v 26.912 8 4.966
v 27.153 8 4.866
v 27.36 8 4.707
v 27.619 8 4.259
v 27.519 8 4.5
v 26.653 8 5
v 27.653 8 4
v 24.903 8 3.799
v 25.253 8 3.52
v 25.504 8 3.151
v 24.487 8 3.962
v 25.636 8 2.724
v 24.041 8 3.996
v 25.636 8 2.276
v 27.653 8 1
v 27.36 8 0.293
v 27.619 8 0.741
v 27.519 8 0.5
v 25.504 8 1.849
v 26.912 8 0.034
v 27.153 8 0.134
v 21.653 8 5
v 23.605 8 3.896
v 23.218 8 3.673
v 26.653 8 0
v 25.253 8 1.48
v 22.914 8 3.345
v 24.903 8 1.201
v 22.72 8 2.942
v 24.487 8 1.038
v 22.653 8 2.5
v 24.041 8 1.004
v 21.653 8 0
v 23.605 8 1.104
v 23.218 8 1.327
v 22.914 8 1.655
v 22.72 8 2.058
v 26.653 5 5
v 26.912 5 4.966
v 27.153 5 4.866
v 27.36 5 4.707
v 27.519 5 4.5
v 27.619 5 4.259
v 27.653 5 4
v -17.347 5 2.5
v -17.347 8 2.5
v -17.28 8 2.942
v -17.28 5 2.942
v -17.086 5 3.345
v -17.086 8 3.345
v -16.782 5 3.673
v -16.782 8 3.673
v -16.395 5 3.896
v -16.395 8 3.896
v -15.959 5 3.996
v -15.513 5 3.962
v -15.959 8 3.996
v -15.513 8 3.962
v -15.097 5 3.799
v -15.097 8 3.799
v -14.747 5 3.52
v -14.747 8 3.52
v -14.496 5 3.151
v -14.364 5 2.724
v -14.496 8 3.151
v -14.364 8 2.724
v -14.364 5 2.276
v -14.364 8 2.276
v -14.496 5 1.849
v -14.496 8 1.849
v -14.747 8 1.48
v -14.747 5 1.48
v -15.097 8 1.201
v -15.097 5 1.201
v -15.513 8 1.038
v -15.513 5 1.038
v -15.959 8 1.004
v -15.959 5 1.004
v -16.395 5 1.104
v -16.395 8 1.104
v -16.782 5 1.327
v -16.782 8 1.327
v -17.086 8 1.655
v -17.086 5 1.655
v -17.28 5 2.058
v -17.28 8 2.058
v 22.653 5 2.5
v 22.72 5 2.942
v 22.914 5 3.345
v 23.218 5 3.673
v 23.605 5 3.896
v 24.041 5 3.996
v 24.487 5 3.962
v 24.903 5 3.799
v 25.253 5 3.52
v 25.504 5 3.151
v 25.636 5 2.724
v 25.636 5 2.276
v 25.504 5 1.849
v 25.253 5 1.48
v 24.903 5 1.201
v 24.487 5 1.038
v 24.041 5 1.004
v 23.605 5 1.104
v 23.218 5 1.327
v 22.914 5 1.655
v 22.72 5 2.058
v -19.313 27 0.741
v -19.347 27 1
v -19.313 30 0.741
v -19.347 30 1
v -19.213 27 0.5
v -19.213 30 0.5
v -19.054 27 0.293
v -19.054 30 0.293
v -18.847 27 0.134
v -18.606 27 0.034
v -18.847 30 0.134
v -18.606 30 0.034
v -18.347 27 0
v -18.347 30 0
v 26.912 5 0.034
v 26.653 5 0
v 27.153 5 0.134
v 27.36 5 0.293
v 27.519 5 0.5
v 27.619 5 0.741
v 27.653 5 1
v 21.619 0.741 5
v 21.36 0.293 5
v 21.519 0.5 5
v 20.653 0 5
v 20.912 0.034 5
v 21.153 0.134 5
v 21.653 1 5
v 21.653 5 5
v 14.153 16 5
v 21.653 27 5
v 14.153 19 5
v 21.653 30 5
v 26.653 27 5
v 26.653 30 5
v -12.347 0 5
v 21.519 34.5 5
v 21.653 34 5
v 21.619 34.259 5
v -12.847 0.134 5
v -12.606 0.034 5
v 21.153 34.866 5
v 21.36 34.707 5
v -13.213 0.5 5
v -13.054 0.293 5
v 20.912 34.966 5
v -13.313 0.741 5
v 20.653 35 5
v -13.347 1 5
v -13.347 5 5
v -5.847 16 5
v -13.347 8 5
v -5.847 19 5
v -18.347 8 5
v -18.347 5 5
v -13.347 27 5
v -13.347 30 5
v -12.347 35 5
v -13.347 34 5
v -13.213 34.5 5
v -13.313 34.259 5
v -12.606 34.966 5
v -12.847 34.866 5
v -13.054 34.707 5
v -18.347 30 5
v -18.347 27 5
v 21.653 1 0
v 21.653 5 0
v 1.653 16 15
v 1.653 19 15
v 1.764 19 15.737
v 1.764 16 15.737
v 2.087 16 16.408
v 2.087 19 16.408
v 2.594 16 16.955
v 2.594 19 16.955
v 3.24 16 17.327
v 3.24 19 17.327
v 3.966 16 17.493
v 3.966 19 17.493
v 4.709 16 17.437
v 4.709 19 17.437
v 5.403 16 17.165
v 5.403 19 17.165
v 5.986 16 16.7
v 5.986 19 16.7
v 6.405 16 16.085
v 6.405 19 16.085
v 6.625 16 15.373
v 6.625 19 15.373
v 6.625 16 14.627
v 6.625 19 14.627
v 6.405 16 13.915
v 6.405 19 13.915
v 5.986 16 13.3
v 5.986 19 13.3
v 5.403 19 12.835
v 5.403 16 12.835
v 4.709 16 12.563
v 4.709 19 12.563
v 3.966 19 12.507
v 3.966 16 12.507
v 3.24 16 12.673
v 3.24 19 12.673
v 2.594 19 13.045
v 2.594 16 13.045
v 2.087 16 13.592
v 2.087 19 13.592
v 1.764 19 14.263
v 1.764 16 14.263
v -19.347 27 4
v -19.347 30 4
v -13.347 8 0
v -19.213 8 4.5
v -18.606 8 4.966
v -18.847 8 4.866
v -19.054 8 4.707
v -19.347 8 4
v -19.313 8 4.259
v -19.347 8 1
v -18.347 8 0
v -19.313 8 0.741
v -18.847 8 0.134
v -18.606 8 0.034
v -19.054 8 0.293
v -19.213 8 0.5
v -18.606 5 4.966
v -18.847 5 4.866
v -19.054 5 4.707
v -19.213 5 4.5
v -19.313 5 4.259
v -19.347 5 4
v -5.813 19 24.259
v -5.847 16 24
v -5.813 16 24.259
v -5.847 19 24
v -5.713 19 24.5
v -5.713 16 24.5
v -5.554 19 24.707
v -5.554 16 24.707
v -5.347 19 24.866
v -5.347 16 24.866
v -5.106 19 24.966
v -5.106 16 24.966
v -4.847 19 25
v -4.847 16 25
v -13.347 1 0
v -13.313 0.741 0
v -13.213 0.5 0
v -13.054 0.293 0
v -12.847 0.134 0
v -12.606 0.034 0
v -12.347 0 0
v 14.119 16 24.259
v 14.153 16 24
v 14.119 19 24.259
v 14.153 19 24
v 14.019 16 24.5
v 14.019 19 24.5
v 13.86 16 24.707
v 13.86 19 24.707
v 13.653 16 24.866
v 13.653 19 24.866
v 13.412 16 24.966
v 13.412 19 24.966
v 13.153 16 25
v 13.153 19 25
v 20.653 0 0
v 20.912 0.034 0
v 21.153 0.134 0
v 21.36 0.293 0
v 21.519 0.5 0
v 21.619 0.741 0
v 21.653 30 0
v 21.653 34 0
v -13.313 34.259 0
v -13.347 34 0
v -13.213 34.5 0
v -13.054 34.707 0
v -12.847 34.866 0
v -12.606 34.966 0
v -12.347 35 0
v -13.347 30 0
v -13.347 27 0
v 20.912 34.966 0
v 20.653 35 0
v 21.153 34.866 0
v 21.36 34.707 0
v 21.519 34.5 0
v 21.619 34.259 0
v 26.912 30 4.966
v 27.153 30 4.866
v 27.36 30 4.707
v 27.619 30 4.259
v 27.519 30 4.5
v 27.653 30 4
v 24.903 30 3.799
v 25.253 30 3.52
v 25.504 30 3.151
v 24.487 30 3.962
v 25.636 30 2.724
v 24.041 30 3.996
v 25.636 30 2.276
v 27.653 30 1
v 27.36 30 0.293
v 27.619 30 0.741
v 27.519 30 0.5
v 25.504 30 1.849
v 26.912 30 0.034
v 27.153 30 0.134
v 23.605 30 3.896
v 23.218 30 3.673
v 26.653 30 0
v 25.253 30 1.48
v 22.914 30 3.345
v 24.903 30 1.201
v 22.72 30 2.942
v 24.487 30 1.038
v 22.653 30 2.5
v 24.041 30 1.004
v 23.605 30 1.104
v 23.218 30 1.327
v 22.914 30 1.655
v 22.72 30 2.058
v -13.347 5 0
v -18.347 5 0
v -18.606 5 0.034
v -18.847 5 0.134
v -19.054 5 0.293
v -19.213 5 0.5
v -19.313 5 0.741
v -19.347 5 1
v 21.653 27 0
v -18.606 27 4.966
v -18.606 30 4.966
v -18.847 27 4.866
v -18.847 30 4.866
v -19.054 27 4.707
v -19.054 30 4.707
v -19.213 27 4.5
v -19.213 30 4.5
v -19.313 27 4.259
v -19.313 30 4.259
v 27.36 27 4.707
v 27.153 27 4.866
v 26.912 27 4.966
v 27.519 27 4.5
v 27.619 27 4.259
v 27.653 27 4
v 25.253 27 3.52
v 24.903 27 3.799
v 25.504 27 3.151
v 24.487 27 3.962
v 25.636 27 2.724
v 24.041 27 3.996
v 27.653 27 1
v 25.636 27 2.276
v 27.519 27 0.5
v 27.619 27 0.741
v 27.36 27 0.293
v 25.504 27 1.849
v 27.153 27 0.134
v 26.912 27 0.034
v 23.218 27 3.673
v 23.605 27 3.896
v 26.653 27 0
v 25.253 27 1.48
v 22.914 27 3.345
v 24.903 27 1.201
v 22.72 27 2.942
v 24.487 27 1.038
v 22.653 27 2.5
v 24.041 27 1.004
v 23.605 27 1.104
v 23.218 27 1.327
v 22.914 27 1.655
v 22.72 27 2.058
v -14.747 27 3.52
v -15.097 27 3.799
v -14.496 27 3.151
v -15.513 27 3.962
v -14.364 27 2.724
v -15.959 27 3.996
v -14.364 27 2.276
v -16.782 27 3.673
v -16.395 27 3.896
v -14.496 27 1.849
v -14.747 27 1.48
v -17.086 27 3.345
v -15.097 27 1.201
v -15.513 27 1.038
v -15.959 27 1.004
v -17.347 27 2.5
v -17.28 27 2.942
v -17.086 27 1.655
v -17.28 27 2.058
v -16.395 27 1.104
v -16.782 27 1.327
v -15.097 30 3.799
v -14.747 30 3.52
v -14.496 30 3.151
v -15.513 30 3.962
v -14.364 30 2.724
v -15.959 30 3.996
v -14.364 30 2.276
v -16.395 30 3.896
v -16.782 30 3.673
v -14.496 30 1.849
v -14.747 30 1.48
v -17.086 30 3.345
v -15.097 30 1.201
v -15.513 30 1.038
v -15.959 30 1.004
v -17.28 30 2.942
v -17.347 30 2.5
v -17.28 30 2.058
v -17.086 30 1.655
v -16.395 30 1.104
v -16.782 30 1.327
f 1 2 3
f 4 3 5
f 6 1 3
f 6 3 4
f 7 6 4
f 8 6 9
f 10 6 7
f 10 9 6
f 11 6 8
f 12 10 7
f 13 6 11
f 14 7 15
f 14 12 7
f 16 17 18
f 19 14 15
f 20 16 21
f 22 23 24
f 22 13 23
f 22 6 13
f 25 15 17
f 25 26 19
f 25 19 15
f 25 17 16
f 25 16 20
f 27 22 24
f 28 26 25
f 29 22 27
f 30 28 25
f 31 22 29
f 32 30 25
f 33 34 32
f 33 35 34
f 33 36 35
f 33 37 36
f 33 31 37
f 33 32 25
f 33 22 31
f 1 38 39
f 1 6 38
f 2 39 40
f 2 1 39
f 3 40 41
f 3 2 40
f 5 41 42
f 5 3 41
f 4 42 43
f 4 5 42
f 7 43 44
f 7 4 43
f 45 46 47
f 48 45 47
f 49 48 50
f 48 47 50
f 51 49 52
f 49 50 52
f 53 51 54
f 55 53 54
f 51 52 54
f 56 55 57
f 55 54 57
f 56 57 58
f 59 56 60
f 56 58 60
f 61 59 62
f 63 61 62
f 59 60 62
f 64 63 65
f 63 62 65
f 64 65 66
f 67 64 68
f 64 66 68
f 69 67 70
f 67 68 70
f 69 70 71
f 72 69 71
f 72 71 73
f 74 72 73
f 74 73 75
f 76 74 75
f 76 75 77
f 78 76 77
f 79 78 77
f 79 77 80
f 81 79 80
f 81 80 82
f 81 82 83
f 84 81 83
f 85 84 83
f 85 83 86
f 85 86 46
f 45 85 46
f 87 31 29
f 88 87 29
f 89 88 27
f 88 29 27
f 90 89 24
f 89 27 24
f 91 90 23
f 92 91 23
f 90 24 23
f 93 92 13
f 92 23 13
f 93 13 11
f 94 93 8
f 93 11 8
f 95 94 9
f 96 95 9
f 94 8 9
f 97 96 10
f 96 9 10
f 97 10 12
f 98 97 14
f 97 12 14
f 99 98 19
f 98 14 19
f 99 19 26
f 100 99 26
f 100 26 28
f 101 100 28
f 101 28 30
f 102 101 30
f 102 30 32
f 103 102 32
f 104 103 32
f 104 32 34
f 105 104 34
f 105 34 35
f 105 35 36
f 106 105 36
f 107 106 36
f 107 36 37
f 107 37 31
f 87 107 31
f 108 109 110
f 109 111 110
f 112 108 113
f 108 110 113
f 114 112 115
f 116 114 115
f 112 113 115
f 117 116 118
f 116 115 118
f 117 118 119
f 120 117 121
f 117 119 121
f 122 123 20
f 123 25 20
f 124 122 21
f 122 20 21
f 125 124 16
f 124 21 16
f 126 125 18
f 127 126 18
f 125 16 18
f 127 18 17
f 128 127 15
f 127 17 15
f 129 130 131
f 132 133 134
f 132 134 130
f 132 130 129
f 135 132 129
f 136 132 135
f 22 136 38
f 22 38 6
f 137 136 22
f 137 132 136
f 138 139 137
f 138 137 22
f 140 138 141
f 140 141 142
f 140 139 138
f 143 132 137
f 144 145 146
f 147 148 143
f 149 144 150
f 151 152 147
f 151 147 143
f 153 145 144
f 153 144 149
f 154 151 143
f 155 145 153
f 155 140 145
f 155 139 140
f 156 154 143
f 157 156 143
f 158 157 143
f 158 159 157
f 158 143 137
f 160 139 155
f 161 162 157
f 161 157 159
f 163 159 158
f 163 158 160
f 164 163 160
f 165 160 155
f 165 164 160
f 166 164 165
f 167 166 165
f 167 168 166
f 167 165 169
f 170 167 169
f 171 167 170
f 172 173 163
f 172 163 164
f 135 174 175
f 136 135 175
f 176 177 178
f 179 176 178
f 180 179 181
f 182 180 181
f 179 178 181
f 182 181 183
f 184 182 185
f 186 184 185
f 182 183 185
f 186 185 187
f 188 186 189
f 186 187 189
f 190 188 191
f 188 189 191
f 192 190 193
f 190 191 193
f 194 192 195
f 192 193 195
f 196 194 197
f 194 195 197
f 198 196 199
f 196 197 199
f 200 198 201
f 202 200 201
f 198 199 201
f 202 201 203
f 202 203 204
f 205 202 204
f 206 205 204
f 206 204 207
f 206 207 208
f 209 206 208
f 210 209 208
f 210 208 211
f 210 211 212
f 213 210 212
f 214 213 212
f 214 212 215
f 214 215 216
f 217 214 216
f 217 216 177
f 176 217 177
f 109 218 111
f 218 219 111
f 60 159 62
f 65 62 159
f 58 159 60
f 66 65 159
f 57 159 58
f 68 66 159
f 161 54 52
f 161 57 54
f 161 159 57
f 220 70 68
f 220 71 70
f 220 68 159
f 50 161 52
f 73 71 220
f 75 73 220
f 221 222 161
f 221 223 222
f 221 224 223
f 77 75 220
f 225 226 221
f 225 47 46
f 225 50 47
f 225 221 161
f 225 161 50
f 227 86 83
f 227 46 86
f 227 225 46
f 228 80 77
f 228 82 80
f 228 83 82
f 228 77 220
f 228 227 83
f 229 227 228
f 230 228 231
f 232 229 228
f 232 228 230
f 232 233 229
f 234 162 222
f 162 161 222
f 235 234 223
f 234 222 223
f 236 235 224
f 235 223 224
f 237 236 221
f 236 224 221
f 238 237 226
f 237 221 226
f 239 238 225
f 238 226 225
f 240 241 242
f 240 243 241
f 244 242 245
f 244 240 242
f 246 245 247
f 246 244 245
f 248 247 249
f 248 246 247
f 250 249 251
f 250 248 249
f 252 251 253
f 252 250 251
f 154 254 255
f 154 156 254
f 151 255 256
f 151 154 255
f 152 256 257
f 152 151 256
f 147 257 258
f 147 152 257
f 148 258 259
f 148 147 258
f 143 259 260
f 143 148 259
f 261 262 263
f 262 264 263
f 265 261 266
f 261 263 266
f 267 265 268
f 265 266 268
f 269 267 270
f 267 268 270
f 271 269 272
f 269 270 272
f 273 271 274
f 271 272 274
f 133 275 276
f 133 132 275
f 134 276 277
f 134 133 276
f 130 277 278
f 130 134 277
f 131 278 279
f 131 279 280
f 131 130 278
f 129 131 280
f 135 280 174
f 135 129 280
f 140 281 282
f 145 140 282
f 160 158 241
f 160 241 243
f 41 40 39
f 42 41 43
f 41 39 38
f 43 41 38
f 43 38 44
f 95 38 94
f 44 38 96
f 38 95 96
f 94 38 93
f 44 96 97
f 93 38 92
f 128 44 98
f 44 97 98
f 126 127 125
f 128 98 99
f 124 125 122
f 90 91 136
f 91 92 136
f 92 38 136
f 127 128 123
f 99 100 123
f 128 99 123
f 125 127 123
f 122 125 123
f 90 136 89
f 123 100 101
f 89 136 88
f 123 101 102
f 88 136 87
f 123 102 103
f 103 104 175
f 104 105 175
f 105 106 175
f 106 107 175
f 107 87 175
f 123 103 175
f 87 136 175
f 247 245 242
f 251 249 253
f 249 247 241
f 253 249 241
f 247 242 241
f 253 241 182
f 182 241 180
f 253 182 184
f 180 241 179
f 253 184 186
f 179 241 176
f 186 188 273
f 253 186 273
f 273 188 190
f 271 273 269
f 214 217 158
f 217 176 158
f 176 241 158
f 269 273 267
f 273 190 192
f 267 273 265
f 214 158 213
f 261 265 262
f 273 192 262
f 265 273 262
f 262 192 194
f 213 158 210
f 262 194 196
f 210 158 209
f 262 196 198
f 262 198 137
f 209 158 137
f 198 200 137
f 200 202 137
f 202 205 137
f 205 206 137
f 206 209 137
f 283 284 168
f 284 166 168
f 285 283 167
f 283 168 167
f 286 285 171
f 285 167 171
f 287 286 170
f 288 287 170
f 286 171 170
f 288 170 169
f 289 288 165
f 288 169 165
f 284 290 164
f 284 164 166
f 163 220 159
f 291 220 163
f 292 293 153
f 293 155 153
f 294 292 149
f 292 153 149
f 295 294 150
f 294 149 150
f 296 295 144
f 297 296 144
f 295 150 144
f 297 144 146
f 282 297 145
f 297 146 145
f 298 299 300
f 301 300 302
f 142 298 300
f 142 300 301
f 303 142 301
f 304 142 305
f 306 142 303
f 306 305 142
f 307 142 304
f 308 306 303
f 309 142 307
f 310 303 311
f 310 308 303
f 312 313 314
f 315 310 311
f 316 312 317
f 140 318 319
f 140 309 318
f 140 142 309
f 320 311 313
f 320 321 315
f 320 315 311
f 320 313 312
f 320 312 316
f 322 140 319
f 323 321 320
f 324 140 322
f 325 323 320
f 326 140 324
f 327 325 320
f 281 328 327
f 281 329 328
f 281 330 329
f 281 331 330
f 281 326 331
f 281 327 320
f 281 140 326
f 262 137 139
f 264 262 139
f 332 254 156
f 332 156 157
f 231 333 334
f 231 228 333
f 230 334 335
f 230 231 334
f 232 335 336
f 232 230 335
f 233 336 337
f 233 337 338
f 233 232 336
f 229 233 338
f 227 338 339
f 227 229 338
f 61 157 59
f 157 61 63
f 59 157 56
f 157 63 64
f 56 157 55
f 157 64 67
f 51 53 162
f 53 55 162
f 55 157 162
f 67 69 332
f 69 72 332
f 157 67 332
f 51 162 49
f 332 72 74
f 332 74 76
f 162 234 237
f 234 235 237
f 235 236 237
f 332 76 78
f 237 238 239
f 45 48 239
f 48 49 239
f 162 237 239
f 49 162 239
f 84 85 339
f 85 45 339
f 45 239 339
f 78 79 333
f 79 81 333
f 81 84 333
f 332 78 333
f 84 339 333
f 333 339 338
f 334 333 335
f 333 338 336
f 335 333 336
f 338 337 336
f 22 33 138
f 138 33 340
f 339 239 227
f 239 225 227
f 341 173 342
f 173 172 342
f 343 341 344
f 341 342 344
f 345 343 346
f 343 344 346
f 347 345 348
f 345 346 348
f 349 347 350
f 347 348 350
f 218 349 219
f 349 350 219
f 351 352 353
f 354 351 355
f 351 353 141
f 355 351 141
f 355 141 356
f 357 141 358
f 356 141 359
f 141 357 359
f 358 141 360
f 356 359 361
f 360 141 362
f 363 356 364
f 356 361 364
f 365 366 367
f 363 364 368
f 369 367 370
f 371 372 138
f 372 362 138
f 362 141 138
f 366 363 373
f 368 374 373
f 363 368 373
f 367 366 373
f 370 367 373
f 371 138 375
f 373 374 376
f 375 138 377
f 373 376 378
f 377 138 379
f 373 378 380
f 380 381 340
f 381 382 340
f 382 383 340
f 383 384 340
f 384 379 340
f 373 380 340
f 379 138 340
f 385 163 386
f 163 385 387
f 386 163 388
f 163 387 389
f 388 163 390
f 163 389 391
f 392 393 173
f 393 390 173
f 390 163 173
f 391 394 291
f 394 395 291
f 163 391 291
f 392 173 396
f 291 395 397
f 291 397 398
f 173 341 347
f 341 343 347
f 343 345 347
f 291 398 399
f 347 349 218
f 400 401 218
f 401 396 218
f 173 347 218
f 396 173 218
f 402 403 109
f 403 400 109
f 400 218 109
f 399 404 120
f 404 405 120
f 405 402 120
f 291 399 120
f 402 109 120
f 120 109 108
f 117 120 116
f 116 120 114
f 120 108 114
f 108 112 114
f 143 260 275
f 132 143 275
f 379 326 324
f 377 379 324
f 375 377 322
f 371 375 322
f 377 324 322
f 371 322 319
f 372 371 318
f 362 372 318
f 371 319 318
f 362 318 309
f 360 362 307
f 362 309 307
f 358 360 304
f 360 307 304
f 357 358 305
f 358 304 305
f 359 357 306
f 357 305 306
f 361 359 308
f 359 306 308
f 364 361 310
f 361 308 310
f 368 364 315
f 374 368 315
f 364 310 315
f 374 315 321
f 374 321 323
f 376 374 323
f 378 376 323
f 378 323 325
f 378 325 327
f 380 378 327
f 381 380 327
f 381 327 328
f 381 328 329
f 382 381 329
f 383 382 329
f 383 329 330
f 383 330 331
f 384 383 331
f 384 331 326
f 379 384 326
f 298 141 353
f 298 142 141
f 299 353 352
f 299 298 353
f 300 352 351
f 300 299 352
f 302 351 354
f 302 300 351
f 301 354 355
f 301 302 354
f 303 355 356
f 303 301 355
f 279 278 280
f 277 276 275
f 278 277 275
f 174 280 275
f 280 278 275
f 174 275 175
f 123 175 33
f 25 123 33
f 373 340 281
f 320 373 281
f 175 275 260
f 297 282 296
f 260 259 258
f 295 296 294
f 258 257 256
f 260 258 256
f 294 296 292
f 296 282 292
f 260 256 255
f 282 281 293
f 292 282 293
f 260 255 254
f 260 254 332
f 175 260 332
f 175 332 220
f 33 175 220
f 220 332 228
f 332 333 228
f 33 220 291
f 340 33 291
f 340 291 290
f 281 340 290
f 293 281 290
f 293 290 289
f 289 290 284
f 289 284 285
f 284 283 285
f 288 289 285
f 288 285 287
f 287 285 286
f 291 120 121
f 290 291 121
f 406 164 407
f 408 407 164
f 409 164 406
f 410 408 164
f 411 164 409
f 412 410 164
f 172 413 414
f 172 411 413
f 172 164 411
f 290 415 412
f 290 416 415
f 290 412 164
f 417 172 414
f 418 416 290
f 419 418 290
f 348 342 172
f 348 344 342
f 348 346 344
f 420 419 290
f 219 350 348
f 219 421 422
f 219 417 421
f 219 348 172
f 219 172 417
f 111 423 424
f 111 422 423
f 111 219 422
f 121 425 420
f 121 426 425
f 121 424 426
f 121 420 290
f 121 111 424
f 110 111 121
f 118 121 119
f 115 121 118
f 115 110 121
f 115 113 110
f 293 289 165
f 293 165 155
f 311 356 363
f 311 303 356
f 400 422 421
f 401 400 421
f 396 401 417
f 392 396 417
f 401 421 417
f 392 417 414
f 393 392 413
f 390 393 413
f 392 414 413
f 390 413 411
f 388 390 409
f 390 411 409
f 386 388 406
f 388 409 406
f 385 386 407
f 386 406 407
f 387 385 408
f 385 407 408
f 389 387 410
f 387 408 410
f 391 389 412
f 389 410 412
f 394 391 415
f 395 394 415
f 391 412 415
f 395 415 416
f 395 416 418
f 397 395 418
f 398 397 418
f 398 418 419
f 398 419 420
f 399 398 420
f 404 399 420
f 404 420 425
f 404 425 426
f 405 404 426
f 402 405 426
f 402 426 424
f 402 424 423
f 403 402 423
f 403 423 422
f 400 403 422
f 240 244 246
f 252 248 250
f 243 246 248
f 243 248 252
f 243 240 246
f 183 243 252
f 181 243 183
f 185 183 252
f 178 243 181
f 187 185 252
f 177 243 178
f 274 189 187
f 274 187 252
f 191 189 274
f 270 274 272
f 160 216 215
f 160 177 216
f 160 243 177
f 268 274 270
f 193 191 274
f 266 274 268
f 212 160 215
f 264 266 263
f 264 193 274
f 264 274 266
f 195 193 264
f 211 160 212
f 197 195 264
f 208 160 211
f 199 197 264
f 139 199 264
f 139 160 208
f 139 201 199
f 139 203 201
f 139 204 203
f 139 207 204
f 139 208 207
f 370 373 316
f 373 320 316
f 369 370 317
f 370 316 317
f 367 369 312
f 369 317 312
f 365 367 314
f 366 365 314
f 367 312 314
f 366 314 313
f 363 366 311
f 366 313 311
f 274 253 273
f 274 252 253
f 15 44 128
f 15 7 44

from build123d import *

# Parameters (mm, degrees)
SKETCH1_W                = 35
SKETCH1_H                = 35
BOSS_EXTRUDE2_DEPTH      = 5
BOSS_EXTRUDE3_DEPTH      = 6
BOSS_EXTRUDE3_DEPTH_BACK = 41
SKETCH2_W                = 5
SKETCH2_H                = 3
FILLET1_R                = 1
F_3_0MM_DOWEL_HOLE1_D    = 3
SKETCH6_W                = 20
SKETCH6_H                = 3
BOSS_EXTRUDE4_DEPTH      = 20
F_5_0MM_DOWEL_HOLE1_D    = 5
FILLET2_R                = 1
FILLET3_R                = 1


with BuildPart() as part:
    # Sketch1 → Boss-Extrude2 (new body)
    with BuildSketch(Plane.XY):
        with Locations((4.15299246, 17.5)):
            Rectangle(SKETCH1_W, SKETCH1_H)
    extrude(amount=BOSS_EXTRUDE2_DEPTH)

    # Sketch2 → Boss-Extrude3 (add, two sides: drawn at the far end of the back side and taken through both)
    with BuildSketch(Plane(origin=(21.65299246, 0, 0), x_dir=(0, 0, -1), z_dir=(1, 0, 0)).offset(-BOSS_EXTRUDE3_DEPTH_BACK)):
        with Locations((-2.5, 28.5)):
            Rectangle(SKETCH2_W, SKETCH2_H)
        with Locations((-2.5, 6.5)):
            Rectangle(SKETCH2_W, SKETCH2_H)
    extrude(amount=BOSS_EXTRUDE3_DEPTH + BOSS_EXTRUDE3_DEPTH_BACK)

    # Fillet1
    fillet1_edges = [part.edges().sort_by_distance(p)[0] for p in [
        (-19.34700754, 28.5, 5),
        (-19.34700754, 28.5, 0),
        (27.65299246, 28.5, 5),
        (27.65299246, 28.5, 0),
        (-19.34700754, 6.5, 5),
        (-19.34700754, 6.5, 0),
        (27.65299246, 6.5, 5),
        (27.65299246, 6.5, 0),
    ]]
    fillet(fillet1_edges, radius=FILLET1_R)

    # Ø3.0mm Dowel Hole1 (through all)
    with Locations(Plane.XZ):
        with Locations((24.15299246, 2.5), (-15.84700754, 2.5)):
            Hole(F_3_0MM_DOWEL_HOLE1_D / 2)

    # Sketch6 → Boss-Extrude4 (add)
    with BuildSketch(Plane.XY.offset(5)):
        with Locations((4.15299246, 17.5)):
            Rectangle(SKETCH6_W, SKETCH6_H)
    extrude(amount=BOSS_EXTRUDE4_DEPTH)

    # Ø5.0mm Dowel Hole1 (through all)
    with Locations(Plane.XZ):
        with Locations((4.15299246, 15)):
            Hole(F_5_0MM_DOWEL_HOLE1_D / 2)

    # Fillet2
    fillet2_edges = [part.edges().sort_by_distance(p)[0] for p in [
        (-5.84700754, 17.5, 25),
        (14.15299246, 17.5, 25),
    ]]
    fillet(fillet2_edges, radius=FILLET2_R)

    # Fillet3
    fillet3_edges = [part.edges().sort_by_distance(p)[0] for p in [
        (21.65299246, 0, 2.5),
        (-13.34700754, 0, 2.5),
        (-13.34700754, 35, 2.5),
        (21.65299246, 35, 2.5),
    ]]
    fillet(fillet3_edges, radius=FILLET3_R)


solid = part.part
